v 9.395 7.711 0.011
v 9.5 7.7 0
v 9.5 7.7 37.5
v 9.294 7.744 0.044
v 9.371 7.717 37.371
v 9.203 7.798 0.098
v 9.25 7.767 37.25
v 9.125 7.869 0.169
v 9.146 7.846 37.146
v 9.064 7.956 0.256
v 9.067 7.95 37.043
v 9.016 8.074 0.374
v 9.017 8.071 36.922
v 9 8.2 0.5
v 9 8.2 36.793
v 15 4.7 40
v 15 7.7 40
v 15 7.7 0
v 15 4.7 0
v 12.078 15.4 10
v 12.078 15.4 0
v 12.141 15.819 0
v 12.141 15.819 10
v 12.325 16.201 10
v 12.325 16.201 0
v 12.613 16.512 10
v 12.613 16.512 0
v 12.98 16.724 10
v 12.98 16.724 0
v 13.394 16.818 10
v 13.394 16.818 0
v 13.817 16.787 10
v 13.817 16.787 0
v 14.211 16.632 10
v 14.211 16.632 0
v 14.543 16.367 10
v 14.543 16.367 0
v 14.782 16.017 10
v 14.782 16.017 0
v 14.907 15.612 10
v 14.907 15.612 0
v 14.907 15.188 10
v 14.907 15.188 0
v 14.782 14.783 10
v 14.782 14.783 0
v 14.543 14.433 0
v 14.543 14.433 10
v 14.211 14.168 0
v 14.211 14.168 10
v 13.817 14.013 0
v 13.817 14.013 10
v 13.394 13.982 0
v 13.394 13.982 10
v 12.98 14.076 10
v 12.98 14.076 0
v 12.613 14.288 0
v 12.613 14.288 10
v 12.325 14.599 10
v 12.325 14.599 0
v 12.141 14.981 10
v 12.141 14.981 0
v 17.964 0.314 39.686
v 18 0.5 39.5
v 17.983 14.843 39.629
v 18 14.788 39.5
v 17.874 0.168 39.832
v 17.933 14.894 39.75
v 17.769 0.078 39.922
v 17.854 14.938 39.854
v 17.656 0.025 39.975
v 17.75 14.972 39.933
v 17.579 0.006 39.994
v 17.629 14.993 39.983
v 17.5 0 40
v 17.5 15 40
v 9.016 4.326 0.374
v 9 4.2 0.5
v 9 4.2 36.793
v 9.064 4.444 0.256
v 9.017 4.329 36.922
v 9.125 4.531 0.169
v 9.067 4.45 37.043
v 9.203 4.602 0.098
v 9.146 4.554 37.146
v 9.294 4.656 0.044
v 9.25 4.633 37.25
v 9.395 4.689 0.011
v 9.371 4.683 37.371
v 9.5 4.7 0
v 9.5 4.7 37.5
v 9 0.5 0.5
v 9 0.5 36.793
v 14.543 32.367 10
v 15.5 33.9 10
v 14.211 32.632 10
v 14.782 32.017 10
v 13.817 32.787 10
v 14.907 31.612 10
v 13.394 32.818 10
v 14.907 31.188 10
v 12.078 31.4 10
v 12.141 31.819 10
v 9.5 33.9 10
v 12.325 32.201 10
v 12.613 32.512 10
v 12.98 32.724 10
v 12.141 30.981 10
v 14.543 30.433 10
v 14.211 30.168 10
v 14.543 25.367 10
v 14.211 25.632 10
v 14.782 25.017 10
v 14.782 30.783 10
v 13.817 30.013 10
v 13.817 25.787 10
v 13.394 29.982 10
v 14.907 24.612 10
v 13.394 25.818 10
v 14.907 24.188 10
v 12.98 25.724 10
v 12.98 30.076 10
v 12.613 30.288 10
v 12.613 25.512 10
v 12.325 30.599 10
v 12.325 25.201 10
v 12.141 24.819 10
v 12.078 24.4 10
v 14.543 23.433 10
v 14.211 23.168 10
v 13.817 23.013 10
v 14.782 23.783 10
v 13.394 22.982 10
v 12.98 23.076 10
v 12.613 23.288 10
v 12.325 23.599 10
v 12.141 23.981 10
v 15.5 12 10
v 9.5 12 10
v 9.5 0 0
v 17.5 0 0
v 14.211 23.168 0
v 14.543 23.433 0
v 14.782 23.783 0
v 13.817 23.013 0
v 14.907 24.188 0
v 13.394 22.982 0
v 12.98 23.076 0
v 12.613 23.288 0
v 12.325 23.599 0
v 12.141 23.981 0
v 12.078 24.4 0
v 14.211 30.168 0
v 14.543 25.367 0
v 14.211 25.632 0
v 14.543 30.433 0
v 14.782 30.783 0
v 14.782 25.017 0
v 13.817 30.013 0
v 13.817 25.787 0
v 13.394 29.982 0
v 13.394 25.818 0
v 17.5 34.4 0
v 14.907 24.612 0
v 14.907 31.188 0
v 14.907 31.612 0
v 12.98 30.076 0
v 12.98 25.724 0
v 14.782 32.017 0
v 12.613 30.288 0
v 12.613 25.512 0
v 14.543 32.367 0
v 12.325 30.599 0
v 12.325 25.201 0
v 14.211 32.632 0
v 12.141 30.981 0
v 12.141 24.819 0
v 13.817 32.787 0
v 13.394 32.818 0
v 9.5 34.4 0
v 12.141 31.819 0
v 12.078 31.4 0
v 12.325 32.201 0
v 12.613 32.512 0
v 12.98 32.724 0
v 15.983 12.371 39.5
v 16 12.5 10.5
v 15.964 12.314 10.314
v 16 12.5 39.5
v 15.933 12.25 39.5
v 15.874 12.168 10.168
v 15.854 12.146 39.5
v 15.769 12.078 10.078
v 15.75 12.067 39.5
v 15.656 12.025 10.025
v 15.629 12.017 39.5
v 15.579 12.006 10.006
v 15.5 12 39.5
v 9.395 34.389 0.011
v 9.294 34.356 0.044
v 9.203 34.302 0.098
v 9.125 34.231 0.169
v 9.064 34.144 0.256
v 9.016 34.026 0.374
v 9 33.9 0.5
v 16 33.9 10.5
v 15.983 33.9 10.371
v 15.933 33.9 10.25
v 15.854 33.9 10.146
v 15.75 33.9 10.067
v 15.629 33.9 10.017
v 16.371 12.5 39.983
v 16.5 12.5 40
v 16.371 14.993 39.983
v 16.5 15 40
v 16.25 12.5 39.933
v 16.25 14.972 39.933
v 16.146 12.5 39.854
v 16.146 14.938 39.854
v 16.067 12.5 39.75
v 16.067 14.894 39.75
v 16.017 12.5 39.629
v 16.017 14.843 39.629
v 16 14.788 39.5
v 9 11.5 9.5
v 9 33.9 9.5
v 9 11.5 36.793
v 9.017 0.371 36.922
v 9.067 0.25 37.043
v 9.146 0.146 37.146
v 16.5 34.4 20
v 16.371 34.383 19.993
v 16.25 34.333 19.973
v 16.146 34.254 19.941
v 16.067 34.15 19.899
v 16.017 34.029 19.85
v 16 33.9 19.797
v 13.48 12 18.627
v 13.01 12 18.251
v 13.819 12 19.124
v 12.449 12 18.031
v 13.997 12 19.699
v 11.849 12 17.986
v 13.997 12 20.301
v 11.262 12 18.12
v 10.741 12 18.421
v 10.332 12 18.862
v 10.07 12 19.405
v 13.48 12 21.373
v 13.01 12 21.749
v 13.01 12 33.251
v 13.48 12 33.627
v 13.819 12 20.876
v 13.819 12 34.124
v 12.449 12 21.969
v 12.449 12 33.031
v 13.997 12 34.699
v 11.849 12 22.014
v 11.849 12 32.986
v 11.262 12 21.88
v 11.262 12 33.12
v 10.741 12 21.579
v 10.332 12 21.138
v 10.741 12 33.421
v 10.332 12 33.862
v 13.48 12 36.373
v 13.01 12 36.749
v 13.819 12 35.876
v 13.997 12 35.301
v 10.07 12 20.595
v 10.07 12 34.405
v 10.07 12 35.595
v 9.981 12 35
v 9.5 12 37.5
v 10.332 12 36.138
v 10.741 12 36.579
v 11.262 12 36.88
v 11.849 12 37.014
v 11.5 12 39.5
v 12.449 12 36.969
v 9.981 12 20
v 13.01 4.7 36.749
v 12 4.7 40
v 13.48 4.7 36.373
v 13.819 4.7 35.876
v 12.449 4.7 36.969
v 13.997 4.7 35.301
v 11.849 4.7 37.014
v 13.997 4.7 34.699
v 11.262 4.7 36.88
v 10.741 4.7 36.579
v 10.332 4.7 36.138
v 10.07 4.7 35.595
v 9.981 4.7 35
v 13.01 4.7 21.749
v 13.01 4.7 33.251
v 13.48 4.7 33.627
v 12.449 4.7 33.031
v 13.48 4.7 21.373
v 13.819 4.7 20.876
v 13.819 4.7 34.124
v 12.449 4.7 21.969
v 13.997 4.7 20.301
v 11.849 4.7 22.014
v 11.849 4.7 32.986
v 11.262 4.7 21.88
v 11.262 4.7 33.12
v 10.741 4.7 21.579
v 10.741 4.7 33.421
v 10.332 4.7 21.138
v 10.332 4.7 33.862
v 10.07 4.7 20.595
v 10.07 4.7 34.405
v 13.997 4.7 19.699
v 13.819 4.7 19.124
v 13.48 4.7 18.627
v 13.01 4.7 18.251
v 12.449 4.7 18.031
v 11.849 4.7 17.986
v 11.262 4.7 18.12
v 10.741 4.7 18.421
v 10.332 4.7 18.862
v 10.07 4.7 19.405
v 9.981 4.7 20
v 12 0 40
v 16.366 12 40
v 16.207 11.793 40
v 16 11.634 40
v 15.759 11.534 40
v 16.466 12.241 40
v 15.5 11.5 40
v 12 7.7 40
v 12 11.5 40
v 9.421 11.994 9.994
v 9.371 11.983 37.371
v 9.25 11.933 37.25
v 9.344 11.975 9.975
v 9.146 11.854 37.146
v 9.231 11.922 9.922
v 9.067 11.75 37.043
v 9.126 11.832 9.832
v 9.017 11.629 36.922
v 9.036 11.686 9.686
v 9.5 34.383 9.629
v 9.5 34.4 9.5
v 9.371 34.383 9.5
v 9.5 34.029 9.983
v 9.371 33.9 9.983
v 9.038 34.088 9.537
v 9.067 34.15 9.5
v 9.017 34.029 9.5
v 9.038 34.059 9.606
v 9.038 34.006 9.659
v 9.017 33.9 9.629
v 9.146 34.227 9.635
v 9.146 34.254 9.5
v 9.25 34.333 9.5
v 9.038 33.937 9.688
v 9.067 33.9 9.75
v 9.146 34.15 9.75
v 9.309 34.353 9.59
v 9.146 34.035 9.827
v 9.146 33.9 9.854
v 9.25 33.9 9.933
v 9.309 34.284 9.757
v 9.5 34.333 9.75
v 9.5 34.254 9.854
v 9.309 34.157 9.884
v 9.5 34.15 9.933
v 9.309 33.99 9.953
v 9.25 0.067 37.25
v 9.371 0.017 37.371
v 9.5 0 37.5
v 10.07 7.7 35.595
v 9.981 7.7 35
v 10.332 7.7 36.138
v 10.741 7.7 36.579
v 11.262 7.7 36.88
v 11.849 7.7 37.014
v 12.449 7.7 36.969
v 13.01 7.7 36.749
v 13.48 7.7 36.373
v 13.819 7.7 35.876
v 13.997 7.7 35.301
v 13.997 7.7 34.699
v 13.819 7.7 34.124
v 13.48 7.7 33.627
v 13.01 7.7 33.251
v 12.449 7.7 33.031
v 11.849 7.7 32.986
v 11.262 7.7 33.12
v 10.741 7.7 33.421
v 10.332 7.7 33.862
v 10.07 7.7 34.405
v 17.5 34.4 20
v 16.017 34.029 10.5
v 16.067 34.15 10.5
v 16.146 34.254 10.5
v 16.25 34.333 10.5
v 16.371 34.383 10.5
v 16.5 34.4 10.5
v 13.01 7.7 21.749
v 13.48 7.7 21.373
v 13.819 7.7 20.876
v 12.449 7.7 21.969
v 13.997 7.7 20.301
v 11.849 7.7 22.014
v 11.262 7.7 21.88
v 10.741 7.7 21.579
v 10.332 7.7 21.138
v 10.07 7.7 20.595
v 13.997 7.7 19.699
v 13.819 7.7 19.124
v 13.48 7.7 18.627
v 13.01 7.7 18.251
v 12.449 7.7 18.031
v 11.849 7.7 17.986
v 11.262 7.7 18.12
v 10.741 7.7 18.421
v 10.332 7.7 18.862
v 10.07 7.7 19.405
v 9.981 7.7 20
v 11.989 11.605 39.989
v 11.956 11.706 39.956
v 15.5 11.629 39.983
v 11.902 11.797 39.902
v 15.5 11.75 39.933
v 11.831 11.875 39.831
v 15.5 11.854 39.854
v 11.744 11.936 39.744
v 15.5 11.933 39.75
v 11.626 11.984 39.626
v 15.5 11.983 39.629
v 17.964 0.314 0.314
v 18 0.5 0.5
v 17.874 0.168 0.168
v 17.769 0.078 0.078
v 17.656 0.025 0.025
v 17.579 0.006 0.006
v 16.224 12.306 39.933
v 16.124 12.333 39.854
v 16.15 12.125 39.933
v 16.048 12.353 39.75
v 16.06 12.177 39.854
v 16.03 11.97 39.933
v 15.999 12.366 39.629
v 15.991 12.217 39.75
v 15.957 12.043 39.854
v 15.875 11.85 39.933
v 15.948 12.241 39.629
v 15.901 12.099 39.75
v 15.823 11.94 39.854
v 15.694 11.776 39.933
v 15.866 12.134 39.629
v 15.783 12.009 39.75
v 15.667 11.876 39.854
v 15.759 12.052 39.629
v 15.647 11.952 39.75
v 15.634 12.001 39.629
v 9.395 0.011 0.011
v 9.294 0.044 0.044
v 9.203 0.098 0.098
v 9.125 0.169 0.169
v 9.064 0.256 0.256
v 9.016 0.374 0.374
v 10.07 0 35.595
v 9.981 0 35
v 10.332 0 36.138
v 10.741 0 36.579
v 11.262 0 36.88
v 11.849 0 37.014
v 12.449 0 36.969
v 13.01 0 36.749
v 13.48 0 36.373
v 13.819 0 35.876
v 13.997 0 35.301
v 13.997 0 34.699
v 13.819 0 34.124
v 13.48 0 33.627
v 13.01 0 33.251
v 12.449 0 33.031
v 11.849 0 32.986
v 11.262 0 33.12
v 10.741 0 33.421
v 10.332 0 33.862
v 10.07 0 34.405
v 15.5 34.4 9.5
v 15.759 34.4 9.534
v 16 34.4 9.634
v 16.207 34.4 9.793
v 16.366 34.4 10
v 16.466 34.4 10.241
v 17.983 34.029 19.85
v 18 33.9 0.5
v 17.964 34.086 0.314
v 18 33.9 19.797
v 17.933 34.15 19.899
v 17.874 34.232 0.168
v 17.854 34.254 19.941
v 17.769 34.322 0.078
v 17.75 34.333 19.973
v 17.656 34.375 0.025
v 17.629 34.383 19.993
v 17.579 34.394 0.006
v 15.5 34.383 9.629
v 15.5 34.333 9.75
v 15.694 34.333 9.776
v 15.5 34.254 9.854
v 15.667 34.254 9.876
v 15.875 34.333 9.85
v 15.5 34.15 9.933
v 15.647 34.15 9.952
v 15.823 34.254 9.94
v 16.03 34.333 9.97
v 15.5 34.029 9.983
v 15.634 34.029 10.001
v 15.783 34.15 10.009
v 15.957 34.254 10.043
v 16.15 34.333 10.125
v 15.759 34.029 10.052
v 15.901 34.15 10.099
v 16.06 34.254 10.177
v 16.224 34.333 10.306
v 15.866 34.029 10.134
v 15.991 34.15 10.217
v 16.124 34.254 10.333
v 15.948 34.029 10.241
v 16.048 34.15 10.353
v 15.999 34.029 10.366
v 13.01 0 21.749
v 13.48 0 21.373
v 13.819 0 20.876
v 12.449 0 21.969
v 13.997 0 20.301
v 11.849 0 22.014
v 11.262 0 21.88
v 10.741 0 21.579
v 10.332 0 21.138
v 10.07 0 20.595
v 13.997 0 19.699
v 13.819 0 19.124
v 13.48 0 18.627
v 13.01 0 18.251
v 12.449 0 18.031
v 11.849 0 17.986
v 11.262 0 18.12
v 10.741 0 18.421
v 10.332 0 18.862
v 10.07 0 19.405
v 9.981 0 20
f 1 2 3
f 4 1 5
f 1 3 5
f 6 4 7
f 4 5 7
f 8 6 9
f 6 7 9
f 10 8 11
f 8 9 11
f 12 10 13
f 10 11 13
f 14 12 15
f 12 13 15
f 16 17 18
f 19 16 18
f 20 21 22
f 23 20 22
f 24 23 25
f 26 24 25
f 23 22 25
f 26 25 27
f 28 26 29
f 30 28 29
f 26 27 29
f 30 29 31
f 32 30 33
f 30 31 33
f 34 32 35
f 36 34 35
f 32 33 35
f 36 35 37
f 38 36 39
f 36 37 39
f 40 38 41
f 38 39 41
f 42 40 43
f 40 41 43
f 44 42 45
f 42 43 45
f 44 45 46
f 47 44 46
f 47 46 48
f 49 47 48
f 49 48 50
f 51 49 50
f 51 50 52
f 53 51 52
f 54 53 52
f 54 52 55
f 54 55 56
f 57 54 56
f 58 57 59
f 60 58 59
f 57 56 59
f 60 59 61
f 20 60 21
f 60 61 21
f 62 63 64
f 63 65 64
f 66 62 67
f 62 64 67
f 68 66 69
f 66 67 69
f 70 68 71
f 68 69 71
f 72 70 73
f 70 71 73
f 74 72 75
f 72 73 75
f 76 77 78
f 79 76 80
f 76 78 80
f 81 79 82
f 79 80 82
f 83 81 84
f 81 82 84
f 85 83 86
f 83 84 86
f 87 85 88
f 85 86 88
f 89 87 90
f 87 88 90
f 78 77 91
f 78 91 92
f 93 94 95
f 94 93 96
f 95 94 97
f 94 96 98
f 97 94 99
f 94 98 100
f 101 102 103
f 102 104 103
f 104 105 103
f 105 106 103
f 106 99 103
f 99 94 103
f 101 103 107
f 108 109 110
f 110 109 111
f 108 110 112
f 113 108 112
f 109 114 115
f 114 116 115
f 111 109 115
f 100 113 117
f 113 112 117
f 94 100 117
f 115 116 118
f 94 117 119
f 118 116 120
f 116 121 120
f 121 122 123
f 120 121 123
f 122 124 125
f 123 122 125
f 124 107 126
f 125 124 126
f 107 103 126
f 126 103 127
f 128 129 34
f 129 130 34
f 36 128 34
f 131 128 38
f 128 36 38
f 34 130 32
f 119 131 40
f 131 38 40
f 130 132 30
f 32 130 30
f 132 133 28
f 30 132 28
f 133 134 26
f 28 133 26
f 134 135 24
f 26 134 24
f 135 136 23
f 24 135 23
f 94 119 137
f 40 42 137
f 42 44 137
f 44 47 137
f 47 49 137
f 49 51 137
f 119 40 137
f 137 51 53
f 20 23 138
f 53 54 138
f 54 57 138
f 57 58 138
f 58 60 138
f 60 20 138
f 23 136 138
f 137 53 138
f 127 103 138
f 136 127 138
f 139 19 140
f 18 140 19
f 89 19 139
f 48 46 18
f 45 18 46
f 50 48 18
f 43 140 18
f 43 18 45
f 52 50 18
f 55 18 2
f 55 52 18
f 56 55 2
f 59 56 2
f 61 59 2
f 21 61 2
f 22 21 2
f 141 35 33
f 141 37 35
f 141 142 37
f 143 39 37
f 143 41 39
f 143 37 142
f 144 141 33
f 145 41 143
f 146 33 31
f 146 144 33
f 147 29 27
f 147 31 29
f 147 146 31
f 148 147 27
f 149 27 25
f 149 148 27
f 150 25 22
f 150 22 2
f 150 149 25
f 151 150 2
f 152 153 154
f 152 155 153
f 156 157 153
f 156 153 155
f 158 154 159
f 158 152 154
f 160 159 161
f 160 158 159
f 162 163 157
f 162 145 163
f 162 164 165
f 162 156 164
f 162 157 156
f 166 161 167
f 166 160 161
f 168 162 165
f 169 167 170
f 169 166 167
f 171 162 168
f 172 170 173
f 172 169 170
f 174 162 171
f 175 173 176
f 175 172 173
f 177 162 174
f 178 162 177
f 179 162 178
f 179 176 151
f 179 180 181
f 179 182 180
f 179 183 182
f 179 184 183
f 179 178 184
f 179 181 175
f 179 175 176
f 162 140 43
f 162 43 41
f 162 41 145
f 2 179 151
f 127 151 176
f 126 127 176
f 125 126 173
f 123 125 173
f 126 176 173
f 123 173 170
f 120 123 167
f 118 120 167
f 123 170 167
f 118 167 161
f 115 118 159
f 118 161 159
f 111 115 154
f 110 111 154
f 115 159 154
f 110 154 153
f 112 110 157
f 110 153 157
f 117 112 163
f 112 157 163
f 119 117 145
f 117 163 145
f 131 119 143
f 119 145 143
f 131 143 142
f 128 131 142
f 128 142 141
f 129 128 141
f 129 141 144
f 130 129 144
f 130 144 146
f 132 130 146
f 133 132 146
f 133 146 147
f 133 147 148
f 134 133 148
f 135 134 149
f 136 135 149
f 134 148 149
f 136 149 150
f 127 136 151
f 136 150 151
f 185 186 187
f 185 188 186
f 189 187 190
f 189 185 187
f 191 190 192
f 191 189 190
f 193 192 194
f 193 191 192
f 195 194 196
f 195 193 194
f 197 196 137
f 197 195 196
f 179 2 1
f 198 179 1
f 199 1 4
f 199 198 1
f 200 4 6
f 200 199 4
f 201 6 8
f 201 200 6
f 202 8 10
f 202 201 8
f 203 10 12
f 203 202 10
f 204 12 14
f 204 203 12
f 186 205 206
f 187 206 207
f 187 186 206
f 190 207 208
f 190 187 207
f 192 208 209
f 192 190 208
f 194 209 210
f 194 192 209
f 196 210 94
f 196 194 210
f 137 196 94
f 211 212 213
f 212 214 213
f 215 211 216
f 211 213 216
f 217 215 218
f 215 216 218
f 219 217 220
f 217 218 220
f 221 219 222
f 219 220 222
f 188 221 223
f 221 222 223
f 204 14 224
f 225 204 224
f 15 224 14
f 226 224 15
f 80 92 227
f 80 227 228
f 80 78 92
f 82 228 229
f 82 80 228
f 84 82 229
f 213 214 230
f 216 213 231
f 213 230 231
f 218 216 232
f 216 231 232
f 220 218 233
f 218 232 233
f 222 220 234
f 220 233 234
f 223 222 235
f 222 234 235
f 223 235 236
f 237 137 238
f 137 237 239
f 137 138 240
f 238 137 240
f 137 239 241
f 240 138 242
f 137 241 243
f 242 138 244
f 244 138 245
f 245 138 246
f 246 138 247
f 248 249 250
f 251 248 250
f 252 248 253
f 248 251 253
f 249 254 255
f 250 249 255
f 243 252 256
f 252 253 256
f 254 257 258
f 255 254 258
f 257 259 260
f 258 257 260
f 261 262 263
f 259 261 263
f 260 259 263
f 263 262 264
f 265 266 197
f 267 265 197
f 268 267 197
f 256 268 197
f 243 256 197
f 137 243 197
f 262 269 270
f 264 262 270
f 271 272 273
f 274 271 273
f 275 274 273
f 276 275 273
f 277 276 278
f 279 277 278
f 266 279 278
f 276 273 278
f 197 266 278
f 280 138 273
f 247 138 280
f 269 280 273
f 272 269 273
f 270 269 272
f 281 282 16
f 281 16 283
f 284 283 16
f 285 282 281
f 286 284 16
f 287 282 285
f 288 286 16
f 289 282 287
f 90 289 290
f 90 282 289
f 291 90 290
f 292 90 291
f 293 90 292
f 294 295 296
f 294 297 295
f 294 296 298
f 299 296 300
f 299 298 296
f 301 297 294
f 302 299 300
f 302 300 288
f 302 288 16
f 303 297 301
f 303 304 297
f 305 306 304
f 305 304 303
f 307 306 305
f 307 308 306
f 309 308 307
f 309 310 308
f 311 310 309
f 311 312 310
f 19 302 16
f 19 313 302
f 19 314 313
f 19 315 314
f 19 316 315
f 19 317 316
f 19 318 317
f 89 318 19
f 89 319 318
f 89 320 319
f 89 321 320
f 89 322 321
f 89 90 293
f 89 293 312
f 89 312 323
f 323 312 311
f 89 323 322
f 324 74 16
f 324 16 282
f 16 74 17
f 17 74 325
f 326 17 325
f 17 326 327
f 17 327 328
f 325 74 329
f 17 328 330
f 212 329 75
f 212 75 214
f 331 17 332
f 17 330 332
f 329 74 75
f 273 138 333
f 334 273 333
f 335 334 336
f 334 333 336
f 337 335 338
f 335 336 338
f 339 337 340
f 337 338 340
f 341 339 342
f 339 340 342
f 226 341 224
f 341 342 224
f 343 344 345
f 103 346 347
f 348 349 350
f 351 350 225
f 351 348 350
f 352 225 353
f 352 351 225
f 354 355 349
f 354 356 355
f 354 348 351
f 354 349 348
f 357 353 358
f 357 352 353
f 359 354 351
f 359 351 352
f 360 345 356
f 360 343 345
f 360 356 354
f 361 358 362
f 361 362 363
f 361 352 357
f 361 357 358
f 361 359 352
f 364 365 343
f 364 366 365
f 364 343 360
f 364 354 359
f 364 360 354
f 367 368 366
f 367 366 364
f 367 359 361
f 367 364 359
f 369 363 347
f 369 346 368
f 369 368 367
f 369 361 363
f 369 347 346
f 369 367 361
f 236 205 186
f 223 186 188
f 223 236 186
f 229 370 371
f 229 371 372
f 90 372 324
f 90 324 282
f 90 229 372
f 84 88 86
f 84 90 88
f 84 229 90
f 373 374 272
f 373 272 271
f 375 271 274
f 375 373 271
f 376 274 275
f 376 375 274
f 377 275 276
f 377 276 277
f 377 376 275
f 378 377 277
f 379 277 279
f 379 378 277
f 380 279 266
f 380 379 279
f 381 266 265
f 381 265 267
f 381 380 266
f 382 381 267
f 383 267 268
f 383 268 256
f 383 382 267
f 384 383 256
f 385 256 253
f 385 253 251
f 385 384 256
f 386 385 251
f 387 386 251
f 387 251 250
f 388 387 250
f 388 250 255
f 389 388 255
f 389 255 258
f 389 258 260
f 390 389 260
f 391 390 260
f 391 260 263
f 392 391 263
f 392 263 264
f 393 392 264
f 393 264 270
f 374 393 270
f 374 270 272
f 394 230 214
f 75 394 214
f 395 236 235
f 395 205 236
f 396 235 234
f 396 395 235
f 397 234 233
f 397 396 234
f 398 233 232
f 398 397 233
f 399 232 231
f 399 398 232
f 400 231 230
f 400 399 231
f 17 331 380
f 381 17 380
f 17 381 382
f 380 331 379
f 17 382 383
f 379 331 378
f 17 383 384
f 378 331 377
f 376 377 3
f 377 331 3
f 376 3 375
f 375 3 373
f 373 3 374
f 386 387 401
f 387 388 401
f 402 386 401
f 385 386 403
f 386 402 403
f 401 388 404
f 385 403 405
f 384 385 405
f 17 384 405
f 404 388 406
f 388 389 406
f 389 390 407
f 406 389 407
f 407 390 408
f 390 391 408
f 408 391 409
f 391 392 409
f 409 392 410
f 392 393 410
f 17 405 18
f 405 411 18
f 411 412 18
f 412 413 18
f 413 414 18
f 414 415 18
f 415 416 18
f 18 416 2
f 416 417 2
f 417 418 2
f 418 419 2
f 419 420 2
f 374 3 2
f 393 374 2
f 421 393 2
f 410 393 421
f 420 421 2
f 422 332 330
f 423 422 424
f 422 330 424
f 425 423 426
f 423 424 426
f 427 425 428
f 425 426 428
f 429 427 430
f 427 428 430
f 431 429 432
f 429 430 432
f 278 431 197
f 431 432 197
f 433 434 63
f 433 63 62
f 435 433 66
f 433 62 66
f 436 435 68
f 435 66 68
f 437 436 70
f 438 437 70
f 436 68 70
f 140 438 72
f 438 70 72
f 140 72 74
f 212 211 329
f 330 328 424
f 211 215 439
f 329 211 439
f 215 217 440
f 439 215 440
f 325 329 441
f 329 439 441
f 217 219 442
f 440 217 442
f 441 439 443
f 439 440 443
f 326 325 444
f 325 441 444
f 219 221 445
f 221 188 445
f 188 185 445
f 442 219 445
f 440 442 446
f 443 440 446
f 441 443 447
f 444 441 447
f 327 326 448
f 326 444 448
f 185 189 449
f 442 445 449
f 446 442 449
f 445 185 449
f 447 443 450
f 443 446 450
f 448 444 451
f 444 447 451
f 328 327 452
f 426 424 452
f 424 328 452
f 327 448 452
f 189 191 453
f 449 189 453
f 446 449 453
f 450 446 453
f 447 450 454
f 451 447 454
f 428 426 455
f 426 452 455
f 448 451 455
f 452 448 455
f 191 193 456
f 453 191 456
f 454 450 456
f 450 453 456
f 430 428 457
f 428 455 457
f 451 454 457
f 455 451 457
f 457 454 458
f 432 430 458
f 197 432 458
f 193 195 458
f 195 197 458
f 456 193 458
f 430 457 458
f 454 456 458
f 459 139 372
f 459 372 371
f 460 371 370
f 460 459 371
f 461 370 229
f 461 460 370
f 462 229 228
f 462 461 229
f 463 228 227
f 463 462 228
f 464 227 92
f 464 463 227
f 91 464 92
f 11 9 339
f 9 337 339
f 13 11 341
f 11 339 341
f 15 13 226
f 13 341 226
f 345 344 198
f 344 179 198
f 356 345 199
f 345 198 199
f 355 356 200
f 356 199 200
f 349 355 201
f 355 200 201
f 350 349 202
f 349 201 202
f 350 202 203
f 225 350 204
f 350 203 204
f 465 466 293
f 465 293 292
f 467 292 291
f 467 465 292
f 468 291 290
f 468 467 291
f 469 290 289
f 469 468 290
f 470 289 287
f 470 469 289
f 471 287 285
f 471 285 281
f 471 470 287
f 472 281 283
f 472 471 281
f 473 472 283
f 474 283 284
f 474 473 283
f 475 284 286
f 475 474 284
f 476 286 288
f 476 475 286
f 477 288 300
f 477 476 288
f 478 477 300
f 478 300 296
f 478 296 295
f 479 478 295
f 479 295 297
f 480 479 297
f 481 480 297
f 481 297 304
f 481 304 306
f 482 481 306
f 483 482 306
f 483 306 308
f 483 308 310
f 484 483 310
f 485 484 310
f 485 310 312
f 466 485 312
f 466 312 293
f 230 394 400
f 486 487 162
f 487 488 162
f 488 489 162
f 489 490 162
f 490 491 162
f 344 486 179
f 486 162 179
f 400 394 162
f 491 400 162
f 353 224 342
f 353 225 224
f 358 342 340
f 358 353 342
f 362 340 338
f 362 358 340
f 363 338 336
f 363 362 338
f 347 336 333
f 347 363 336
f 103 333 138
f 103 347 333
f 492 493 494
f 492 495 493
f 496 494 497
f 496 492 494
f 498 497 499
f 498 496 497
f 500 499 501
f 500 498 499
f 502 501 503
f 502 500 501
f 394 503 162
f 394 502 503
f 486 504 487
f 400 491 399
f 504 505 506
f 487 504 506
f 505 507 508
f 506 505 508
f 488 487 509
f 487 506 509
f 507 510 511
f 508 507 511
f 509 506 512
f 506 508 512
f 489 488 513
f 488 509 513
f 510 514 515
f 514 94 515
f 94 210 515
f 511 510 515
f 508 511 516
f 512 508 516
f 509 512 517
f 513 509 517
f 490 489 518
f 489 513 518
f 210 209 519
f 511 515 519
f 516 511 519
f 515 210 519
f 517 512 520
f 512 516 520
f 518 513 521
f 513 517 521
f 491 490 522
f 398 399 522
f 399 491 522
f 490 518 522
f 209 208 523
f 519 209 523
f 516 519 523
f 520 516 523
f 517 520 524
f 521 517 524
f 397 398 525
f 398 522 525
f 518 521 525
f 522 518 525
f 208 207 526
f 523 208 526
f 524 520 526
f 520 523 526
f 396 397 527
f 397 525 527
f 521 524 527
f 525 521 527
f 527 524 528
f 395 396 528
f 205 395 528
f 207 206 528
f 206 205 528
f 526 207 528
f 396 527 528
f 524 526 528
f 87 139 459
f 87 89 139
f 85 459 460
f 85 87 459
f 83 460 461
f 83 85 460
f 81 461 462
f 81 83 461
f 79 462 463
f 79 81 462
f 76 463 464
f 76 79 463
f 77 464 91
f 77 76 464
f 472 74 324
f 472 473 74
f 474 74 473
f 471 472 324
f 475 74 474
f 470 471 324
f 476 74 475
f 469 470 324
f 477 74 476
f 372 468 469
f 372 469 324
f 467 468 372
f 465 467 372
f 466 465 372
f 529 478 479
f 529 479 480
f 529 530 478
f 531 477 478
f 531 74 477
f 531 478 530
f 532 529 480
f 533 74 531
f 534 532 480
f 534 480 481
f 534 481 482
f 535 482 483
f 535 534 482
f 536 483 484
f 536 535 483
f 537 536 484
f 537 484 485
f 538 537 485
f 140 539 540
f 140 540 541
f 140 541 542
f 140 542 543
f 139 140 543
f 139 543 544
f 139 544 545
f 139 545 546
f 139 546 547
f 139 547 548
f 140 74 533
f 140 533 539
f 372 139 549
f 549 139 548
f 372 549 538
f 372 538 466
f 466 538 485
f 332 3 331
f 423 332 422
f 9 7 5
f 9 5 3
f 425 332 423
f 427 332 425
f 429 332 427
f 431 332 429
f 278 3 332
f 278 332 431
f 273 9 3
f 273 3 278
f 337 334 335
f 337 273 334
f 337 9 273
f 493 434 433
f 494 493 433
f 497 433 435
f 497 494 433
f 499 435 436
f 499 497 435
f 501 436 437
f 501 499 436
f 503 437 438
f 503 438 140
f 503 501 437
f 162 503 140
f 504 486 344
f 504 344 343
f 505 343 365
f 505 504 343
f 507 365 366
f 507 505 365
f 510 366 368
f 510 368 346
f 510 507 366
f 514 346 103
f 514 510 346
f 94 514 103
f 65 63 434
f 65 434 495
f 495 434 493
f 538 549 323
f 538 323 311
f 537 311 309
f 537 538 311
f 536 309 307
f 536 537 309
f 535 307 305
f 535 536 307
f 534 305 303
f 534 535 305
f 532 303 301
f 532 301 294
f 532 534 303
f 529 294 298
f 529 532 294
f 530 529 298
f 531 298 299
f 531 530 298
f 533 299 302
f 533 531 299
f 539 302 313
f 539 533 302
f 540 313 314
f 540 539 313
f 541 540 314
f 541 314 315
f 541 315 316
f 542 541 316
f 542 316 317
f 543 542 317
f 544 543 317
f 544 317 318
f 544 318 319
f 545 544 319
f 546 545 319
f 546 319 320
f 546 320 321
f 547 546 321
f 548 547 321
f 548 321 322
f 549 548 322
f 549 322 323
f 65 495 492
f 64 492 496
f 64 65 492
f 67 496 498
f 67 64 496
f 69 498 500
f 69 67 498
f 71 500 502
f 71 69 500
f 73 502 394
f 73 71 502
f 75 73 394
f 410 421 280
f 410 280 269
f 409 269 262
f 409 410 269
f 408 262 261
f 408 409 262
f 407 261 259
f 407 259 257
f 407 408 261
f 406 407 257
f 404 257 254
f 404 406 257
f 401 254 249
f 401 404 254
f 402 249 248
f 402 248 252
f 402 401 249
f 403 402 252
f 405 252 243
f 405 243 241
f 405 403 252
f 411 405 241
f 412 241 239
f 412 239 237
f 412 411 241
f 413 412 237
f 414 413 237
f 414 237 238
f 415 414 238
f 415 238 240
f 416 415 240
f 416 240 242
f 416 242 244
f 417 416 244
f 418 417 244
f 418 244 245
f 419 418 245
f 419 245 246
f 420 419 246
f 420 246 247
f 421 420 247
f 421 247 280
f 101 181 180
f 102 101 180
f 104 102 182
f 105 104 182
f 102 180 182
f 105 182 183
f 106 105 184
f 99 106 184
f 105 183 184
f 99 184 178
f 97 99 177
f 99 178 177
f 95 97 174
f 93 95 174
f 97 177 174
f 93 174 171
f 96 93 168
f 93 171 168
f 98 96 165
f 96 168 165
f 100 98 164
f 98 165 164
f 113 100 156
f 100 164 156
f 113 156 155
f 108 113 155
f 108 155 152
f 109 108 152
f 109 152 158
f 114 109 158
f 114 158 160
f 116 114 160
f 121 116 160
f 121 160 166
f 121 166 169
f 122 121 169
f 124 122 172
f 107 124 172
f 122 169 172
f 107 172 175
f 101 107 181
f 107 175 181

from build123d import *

# Parameters (mm, degrees)
SKETCH1_W           = 9
SKETCH1_H           = 34.4
SKETCH1_R           = 1.4224
BOSS_EXTRUDE1_DEPTH = 40
SKETCH1_3_R         = 1.4224
CUT_EXTRUDE1_DEPTH  = 10
SKETCH2_W           = 40
SKETCH2_H           = 3
CUT_EXTRUDE2_DEPTH  = 6
CUT_EXTRUDE3_DEPTH  = 9
CUT_EXTRUDE6_DEPTH  = 7
SKETCH6_R           = 2.0193
CUT_EXTRUDE5_DEPTH  = 20
FILLET2_R           = 0.5
CHAMFER4_SIZE       = 3
SKETCH7_W           = 74.310151154
SKETCH7_H           = 95.165931092
CUT_EXTRUDE7_DEPTH  = 9
FILLET3_R           = 0.5


with BuildPart() as part:
    # Sketch1 → Boss-Extrude1 (new body)
    with BuildSketch(Plane.XY):
        with Locations((4.5, 17.2)):
            Rectangle(SKETCH1_W, SKETCH1_H)
        with Locations((4.5, 15.4)):
            Circle(SKETCH1_R, mode=Mode.SUBTRACT)
        with Locations((4.5, 24.4)):
            Circle(SKETCH1_R, mode=Mode.SUBTRACT)
        with Locations((4.5, 24.4)):
            Circle(SKETCH1_R)
        with Locations((4.5, 15.4)):
            Circle(SKETCH1_R)
        with Locations((4.5, 31.4)):
            Circle(SKETCH1_R)
    extrude(amount=BOSS_EXTRUDE1_DEPTH)

    # Sketch1<3> → Cut-Extrude1 (cut)
    with BuildSketch(Plane.XY):
        with Locations((4.5, 24.4)):
            Circle(SKETCH1_3_R)
        with Locations((4.5, 31.4)):
            Circle(SKETCH1_3_R)
        with Locations((4.5, 15.4)):
            Circle(SKETCH1_3_R)
    extrude(amount=CUT_EXTRUDE1_DEPTH, mode=Mode.SUBTRACT)

    # Sketch2 → Cut-Extrude2 (cut)
    with BuildSketch(Plane(origin=(9, 0, 0), x_dir=(0, 0, -1), z_dir=(1, 0, 0))):
        with Locations((-20, 6.2)):
            Rectangle(SKETCH2_W, SKETCH2_H)
    extrude(amount=-CUT_EXTRUDE2_DEPTH, mode=Mode.SUBTRACT)

    # Sketch3 → Cut-Extrude3 (cut)
    with BuildSketch(Plane(origin=(9, 0, 0), x_dir=(0, 0, -1), z_dir=(1, 0, 0))):
        Polygon((-20, 34.4), (-40, 15), (-48.379363257, 51.913157268), align=None)
    extrude(amount=-CUT_EXTRUDE3_DEPTH, mode=Mode.SUBTRACT)

    # Sketch5 → Cut-Extrude6 (cut)
    with BuildSketch(Plane.ZY.offset(-9)):
        Polygon((20, 34.4), (10, 34.4), (10, 12), (40, 12), (40, 15), align=None)
    extrude(amount=CUT_EXTRUDE6_DEPTH, mode=Mode.SUBTRACT)

    # Sketch6 → Cut-Extrude5 (cut)
    with BuildSketch(Plane.XZ):
        with Locations((6, 35)):
            Circle(SKETCH6_R)
        with Locations((6, 20)):
            Circle(SKETCH6_R)
    extrude(amount=-CUT_EXTRUDE5_DEPTH, mode=Mode.SUBTRACT)

    # Fillet2
    fillet2_edges = [part.edges().sort_by_distance(p)[0] for p in [
        (0, 0, 20),
        (0, 7.5, 40),
        (0, 34.4, 10),
        (0, 24.7, 30),
        (0, 17.2, 0),
    ]]
    fillet(fillet2_edges, radius=FILLET2_R)

    # Chamfer4
    chamfer4_edges = [part.edges().sort_by_distance(p)[0] for p in [
        (9, 2.35, 40),
        (9, 9.85, 40),
    ]]
    chamfer(chamfer4_edges, length=CHAMFER4_SIZE)

    # Mirror1: part across plane


with BuildPart() as part_1:
    add(part.part)
    add(part.part.mirror(Plane(origin=(9, 0, 40), x_dir=(0, 0, 1), z_dir=(-1, 0, 0))))

    # Sketch7 → Cut-Extrude7 (cut)
    with BuildSketch(Plane.ZY):
        with Locations((29.906214843, 26.493385896)):
            Rectangle(SKETCH7_W, SKETCH7_H)
    extrude(amount=-CUT_EXTRUDE7_DEPTH, mode=Mode.SUBTRACT)

    # Fillet3
    fillet3_edges = [part_1.edges().sort_by_distance(p)[0] for p in [
        (16, 34.4, 15),
        (16, 13.5, 40),
        (14, 12, 40),
        (16, 24.7, 30),
        (16, 12, 25),
        (16, 23.2, 10),
        (9, 2.35, 37),
        (9, 9.85, 37),
        (12.5, 34.4, 10),
        (9, 2.35, 0),
        (9, 0, 18.5),
        (9, 4.7, 18.5),
        (9, 21.05, 0),
        (9, 7.7, 18.5),
        (9, 34.4, 5),
        (9, 23.2, 10),
        (9, 12, 23.5),
    ]]
    fillet(fillet3_edges, radius=FILLET3_R)


solid = part_1.part
